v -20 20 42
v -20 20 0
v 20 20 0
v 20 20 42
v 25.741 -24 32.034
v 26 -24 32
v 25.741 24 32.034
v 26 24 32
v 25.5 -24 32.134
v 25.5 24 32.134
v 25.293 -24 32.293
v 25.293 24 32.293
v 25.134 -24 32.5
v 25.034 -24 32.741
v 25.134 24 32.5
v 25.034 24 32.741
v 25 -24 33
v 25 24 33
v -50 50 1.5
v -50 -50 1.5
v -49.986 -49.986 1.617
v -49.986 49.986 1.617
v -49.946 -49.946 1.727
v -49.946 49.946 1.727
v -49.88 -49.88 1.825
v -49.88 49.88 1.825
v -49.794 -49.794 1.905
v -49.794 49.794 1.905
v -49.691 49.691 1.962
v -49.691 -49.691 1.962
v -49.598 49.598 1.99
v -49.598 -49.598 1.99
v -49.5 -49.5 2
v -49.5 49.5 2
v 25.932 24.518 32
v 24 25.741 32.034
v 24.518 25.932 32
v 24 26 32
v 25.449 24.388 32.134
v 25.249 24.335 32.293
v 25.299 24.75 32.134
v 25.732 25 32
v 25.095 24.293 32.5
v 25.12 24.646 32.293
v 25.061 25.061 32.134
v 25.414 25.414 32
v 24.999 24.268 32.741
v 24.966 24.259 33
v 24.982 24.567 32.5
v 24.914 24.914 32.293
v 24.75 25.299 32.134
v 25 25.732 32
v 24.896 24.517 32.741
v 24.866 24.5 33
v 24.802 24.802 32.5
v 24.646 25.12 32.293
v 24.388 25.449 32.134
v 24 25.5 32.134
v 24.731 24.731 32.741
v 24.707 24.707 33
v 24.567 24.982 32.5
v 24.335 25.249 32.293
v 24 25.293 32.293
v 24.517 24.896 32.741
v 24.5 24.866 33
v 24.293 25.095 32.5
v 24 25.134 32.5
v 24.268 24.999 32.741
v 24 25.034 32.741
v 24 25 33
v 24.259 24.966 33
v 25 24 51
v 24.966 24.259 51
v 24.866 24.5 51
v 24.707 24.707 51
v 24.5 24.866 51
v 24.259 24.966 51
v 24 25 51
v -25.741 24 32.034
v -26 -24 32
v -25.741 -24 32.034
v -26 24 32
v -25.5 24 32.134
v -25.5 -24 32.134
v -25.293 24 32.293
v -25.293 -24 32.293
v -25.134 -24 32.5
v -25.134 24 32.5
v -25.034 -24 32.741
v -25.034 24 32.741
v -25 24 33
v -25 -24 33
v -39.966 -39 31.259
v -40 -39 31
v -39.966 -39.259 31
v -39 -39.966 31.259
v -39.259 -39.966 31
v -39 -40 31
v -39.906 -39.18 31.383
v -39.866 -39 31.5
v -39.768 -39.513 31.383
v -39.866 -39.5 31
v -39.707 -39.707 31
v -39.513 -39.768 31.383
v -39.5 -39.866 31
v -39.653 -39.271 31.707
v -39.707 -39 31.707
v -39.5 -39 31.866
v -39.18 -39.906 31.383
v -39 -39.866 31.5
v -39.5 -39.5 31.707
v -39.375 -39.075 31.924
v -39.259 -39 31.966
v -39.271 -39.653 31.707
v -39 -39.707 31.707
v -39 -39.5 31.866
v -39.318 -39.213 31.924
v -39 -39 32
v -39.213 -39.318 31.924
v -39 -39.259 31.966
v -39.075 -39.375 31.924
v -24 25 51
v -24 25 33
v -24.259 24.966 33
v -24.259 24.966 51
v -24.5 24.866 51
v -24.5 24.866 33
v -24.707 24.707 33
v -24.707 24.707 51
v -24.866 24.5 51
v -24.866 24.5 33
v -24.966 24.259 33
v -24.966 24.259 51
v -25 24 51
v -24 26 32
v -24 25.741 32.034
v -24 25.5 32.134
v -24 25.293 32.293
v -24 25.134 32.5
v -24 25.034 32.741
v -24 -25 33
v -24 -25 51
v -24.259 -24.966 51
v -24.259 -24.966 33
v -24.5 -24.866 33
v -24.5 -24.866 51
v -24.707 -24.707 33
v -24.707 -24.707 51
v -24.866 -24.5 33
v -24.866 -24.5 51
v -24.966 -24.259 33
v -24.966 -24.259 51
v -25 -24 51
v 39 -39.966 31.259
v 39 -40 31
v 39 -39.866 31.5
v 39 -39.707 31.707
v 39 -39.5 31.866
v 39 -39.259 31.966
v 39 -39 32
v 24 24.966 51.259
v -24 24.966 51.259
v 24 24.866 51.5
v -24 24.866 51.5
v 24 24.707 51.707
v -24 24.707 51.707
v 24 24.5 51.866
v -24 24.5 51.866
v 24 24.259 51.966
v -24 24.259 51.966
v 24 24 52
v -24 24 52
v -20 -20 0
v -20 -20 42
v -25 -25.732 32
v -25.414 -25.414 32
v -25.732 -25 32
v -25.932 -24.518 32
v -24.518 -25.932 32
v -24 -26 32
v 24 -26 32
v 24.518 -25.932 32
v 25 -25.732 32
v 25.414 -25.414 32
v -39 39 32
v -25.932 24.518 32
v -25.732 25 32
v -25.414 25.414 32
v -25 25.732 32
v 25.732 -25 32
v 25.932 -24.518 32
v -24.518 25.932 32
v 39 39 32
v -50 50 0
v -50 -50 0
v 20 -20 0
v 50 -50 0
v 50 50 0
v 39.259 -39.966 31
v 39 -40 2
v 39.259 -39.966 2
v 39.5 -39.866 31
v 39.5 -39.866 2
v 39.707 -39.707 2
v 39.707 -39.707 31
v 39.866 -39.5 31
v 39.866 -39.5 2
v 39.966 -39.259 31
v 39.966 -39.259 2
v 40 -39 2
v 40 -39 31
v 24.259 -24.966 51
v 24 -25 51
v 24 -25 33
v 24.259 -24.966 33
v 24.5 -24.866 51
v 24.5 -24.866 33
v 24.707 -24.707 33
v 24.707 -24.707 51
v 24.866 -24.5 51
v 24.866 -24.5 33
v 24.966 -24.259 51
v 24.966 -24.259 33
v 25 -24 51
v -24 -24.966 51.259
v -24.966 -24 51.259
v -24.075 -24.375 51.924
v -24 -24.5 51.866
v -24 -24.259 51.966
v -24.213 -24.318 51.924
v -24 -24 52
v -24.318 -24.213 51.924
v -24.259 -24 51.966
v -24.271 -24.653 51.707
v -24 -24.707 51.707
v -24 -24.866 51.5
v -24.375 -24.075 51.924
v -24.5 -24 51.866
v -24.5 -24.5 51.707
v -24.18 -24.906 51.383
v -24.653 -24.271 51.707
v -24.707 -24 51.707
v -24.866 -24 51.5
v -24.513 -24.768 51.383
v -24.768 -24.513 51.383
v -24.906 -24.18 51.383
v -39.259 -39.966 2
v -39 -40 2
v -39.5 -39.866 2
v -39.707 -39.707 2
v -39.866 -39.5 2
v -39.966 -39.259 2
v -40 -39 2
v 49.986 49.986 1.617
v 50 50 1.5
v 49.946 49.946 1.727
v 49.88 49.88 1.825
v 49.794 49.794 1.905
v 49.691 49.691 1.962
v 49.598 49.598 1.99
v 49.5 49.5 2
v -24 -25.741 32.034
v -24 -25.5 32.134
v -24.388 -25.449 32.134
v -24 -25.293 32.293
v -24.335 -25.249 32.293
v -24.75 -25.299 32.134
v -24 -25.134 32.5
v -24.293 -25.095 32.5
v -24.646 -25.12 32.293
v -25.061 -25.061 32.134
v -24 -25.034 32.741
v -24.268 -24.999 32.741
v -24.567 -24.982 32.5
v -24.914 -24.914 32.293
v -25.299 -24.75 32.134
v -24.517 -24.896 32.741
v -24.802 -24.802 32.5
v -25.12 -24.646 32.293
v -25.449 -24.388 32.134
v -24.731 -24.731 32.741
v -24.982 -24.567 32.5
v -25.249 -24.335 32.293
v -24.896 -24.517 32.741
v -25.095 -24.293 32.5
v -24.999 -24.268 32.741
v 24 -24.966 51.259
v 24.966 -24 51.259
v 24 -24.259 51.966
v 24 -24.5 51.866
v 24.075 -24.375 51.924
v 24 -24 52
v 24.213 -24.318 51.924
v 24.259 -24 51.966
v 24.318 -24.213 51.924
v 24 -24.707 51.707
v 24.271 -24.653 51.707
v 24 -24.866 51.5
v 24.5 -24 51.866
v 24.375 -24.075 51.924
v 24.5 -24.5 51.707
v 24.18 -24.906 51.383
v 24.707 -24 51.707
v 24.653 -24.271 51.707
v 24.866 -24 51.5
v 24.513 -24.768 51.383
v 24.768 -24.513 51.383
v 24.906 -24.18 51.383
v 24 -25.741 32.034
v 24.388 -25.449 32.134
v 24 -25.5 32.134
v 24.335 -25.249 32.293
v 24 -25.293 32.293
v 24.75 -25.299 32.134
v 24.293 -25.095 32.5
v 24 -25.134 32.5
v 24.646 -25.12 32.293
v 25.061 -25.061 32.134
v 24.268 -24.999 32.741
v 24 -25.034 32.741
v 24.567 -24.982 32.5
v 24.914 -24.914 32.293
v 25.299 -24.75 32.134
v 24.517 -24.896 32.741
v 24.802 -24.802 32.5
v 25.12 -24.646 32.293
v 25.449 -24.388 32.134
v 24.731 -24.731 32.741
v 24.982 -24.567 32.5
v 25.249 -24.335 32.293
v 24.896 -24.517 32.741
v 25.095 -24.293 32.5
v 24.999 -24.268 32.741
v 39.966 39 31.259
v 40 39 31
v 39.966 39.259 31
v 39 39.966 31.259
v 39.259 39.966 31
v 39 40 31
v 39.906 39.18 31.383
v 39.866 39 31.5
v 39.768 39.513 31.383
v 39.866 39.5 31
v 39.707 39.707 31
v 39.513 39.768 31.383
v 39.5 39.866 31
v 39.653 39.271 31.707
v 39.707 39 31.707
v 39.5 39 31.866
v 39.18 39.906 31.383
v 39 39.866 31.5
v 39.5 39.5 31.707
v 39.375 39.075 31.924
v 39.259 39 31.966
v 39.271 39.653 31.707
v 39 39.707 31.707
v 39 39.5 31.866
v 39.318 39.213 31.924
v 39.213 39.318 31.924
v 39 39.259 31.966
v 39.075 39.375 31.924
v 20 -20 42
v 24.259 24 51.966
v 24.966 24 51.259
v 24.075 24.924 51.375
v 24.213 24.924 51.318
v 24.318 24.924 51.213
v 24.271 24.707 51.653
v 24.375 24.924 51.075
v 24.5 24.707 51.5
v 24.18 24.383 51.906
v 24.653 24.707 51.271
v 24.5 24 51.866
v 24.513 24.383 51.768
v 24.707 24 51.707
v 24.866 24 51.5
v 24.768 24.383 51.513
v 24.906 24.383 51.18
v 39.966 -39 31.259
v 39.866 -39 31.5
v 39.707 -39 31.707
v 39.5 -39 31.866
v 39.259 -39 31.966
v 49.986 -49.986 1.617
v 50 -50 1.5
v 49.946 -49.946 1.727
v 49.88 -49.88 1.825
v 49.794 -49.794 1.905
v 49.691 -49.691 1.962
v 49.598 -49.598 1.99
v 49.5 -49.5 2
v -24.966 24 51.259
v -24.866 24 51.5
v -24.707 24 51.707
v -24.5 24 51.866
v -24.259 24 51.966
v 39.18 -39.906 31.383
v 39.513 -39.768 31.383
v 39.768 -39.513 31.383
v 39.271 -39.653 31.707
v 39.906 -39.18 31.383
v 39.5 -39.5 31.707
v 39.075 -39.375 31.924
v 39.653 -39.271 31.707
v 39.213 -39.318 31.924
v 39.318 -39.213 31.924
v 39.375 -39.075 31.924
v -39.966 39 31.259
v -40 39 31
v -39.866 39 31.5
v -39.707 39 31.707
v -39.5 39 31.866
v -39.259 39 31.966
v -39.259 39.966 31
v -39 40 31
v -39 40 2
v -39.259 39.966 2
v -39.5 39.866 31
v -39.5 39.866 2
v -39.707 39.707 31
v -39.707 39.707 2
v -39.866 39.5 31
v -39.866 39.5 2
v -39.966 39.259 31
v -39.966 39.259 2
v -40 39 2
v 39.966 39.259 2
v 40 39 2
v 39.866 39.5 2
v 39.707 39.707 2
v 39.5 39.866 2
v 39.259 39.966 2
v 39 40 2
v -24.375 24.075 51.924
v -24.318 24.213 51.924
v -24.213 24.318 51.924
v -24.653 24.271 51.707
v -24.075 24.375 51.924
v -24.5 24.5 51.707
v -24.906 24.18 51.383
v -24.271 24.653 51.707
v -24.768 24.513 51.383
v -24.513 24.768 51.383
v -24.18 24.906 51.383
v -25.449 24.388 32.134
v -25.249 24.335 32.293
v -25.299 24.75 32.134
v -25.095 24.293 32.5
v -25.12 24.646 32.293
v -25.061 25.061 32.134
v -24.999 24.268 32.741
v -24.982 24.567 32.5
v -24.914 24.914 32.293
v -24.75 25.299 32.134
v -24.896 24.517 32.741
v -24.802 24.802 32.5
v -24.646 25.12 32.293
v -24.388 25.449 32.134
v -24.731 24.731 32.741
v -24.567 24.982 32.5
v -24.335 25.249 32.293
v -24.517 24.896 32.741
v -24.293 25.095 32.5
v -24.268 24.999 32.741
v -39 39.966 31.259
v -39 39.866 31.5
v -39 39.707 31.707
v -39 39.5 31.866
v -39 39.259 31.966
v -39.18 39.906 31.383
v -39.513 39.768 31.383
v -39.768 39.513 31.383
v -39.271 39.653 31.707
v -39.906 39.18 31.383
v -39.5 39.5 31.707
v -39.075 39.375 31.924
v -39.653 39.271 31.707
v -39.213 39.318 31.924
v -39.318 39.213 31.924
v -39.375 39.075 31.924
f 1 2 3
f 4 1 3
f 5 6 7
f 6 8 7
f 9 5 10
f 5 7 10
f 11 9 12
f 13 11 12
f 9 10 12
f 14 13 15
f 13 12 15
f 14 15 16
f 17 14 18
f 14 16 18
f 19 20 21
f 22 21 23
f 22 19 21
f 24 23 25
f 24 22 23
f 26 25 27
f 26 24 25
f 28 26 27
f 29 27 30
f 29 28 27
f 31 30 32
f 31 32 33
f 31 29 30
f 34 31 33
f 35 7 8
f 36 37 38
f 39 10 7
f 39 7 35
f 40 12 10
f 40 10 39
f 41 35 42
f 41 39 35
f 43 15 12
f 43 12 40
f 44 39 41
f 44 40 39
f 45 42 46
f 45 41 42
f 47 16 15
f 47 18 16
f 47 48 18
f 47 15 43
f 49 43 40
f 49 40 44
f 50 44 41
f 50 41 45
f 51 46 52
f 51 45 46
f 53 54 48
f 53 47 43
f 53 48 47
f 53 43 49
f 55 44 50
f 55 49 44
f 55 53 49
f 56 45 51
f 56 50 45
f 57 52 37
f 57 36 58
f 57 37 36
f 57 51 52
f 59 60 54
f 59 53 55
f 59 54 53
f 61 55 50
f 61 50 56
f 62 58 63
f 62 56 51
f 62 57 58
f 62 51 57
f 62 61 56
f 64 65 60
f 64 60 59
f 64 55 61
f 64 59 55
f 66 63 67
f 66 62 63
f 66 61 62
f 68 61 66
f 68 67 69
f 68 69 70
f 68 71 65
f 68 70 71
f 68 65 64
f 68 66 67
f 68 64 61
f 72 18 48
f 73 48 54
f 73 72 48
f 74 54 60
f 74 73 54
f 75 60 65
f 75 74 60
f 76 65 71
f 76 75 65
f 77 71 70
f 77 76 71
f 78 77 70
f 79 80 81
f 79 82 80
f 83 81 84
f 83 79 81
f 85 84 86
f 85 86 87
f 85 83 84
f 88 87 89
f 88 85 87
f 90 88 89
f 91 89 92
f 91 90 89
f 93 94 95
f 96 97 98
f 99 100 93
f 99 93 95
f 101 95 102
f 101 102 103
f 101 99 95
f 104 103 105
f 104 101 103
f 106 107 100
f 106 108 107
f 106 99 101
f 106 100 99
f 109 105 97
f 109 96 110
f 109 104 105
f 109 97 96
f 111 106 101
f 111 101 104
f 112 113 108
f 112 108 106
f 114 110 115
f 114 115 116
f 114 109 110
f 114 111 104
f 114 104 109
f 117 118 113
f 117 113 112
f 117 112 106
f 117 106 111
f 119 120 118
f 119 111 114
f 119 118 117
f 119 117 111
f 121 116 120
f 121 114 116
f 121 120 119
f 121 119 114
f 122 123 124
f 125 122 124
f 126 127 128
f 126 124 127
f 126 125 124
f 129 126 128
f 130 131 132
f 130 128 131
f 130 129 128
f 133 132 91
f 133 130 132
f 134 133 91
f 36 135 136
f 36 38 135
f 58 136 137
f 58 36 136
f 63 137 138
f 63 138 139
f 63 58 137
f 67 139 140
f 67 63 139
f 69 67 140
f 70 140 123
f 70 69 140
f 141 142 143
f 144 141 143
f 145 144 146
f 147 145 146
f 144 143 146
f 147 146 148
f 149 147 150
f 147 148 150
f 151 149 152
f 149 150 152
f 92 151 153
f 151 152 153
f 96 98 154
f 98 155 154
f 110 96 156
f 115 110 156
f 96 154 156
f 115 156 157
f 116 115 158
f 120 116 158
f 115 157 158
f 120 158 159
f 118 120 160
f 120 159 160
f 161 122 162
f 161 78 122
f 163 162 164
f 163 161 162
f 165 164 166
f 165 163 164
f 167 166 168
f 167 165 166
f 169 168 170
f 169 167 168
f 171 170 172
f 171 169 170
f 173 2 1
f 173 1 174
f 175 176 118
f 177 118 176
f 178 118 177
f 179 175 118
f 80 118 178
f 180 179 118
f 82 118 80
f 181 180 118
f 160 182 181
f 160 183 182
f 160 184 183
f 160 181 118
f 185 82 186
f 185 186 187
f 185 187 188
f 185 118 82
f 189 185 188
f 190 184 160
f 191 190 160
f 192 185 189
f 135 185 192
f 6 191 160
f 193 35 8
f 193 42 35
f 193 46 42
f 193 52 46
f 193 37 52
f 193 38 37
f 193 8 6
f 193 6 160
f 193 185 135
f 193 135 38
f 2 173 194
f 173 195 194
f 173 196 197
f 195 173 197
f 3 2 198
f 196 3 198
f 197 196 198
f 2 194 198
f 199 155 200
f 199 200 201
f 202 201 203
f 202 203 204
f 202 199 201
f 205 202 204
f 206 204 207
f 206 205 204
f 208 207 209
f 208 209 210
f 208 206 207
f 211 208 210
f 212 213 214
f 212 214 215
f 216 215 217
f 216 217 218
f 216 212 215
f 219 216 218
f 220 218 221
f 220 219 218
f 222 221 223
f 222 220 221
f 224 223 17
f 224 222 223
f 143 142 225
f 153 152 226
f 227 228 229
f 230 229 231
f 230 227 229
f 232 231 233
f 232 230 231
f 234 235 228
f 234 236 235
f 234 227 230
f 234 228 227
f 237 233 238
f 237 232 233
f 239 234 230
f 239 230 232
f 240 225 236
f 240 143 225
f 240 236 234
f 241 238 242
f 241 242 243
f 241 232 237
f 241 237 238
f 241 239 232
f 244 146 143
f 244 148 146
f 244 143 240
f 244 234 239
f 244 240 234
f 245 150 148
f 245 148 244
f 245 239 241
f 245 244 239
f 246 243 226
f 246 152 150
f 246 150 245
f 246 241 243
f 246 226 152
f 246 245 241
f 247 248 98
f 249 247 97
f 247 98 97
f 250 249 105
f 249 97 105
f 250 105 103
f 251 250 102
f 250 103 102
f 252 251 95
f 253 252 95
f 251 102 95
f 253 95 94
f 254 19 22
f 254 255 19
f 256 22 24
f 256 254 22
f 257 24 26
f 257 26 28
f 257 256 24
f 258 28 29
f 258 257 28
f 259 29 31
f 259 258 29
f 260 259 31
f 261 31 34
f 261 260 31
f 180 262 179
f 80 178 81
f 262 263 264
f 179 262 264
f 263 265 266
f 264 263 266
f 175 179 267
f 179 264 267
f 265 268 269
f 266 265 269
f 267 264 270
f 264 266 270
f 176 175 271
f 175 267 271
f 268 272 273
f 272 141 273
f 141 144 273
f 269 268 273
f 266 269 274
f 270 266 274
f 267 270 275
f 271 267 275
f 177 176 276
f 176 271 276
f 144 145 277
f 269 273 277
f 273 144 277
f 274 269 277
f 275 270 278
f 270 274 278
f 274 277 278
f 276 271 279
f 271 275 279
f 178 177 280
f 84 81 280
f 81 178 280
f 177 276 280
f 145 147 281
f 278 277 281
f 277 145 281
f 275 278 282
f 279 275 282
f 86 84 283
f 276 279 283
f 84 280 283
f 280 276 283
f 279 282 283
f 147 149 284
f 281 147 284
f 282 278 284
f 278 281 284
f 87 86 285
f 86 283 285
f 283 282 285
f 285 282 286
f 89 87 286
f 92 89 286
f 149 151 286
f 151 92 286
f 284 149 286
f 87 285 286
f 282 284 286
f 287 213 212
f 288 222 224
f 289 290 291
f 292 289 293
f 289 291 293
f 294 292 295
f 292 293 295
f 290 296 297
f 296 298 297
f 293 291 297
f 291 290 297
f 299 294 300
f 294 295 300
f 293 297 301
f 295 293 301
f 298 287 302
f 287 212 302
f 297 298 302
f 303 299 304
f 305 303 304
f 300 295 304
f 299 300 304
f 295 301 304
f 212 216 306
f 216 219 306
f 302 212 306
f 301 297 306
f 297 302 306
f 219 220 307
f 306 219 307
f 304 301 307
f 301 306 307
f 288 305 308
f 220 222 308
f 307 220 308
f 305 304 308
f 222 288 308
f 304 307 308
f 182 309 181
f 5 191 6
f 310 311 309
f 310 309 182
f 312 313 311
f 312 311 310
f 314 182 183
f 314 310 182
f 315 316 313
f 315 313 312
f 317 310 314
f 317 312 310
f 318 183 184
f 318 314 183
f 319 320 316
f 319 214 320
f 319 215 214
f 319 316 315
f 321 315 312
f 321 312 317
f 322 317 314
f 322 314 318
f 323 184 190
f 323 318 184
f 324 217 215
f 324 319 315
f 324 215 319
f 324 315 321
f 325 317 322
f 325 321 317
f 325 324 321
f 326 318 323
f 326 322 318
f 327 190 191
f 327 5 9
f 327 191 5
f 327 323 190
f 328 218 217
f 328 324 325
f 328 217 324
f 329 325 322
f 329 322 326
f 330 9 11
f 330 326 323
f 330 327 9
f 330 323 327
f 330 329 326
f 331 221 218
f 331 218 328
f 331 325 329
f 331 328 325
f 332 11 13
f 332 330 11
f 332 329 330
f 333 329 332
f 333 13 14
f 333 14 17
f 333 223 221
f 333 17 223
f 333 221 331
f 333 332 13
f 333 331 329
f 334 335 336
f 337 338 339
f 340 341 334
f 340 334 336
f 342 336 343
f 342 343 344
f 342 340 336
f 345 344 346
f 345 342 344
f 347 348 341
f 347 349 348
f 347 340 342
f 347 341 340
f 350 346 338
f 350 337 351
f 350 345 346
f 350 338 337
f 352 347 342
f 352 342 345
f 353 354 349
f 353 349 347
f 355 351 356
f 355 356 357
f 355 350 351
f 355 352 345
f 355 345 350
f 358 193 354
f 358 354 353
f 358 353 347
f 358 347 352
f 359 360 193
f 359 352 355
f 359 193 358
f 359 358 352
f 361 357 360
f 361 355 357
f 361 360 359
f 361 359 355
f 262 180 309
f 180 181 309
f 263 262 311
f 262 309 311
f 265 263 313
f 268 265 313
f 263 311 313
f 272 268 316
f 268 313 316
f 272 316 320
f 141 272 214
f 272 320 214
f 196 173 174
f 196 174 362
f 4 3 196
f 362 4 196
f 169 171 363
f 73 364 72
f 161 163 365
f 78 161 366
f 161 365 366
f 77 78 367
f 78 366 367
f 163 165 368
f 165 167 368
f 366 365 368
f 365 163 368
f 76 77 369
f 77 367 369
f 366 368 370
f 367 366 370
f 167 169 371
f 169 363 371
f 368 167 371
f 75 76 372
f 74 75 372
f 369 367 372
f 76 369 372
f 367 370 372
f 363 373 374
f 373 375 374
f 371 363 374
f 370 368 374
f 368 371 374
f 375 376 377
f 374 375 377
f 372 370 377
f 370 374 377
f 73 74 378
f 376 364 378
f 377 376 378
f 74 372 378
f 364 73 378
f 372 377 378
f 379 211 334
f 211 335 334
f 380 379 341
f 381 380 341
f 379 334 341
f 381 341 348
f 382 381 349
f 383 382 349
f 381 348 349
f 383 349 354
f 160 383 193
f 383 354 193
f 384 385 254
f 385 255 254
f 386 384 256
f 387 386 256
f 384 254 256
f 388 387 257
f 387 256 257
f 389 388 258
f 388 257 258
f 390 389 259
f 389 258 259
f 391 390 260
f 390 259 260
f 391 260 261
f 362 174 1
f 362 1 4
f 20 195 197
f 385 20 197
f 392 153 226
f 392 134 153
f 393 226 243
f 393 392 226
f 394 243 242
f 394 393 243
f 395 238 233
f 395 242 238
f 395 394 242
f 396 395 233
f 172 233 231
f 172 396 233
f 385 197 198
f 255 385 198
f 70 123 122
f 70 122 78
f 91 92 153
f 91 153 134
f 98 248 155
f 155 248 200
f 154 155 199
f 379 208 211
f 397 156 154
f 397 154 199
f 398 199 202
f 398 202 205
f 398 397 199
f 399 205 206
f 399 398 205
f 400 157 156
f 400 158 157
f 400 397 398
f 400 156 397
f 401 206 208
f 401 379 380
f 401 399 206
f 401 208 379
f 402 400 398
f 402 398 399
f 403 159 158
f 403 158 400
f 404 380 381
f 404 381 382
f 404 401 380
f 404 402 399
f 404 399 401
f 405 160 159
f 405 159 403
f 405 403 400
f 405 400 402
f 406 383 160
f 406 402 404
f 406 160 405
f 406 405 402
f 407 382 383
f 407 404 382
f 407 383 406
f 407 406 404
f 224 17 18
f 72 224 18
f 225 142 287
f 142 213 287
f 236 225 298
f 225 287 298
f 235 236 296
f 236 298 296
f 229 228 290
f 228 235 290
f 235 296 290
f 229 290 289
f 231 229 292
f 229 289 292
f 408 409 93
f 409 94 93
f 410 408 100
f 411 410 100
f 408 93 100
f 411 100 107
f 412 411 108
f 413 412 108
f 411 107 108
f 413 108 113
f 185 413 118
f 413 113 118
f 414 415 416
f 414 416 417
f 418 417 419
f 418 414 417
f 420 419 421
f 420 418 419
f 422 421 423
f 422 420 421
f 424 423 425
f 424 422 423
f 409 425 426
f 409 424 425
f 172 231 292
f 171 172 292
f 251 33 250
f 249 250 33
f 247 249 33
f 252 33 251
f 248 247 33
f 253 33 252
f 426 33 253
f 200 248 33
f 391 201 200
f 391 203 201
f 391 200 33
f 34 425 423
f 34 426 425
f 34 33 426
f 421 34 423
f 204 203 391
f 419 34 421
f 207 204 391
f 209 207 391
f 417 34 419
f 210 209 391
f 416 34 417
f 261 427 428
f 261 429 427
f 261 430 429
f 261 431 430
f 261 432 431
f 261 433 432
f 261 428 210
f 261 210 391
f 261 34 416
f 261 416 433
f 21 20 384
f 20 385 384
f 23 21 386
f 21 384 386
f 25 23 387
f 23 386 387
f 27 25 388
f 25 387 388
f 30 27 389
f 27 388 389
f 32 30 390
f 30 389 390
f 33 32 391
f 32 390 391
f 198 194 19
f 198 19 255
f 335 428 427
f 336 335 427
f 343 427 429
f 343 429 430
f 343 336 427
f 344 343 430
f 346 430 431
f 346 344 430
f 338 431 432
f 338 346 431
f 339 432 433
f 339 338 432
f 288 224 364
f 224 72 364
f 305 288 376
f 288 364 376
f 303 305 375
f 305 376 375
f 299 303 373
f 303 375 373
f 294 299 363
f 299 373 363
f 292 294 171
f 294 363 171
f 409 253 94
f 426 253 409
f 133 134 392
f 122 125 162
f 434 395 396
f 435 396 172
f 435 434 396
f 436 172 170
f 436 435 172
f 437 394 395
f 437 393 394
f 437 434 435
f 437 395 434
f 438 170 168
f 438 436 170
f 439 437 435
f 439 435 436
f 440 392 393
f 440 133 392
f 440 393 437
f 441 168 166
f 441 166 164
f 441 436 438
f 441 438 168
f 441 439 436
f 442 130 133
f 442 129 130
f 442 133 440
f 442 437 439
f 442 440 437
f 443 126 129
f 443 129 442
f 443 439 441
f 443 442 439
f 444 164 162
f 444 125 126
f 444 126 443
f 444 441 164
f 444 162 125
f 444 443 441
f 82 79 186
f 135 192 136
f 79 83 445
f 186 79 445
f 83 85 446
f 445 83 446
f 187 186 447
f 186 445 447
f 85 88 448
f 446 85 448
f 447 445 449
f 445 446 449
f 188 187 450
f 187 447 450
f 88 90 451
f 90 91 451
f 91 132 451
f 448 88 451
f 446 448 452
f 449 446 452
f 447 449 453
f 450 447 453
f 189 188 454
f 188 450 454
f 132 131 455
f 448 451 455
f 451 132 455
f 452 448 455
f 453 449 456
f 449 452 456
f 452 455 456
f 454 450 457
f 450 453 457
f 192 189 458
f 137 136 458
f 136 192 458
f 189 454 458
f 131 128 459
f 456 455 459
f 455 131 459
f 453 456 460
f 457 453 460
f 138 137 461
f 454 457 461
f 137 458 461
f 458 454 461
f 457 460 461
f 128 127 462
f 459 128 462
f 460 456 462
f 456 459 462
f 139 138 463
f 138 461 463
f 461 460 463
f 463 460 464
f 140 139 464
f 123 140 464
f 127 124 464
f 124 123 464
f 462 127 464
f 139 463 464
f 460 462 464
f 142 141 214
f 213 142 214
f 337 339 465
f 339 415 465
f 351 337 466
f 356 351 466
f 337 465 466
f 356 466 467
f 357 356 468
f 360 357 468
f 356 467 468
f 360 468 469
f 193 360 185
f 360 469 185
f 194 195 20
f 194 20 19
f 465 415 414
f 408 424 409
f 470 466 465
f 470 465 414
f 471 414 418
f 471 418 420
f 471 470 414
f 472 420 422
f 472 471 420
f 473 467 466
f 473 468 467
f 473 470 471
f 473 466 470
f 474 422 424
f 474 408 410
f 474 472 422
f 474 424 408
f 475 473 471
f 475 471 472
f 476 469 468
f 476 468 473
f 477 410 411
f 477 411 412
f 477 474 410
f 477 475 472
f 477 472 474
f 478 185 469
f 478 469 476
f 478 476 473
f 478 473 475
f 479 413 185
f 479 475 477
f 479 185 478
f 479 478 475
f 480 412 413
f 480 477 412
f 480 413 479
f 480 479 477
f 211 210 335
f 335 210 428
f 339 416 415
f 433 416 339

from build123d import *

# Parameters (mm, degrees)
F0_W      = 100
F0_H      = 100
F1_DEPTH  = 2
F2_R      = 0.5
F4_W      = 80
F4_H      = 80
F5_DEPTH  = 30
F6_R      = 1
F7_R      = 1
F8_W      = 50
F8_H      = 50
F9_DEPTH  = 20
F10_R     = 1
F11_W     = 40
F11_H     = 40
F12_DEPTH = 42


with BuildPart() as f1:
    # F0 (on Top) → F1 (new body)
    with BuildSketch(Plane.XY):
        Rectangle(F0_W, F0_H)
    extrude(amount=F1_DEPTH)

    # F2
    f2_edges = [f1.edges().sort_by_distance(p)[0] for p in [
        (50, 0, 2),
        (0, 50, 2),
        (-50, 0, 2),
        (0, -50, 2),
    ]]
    fillet(f2_edges, radius=F2_R)

    # F4 (on offset) → F5 (join)
    with BuildSketch(Plane.XY.offset(2)):
        Rectangle(F4_W, F4_H)
    extrude(amount=F5_DEPTH)

    # F6
    f6_edges = [f1.edges().sort_by_distance(p)[0] for p in [
        (-40, -40, 17),
        (40, -40, 17),
        (40, 40, 17),
        (-40, 40, 17),
    ]]
    fillet(f6_edges, radius=F6_R)

    # F7
    f7_edges = [f1.edges().sort_by_distance(p)[0] for p in [
        (40, 0, 32),
        (39.707107, -39.707107, 32),
        (39.707107, 39.707107, 32),
        (0, -40, 32),
        (0, 40, 32),
        (-39.707107, -39.707107, 32),
        (-39.707107, 39.707107, 32),
        (-40, 0, 32),
    ]]
    fillet(f7_edges, radius=F7_R)

    # F8 (on face) → F9 (join)
    with BuildSketch(Plane.XY.offset(32)):
        Rectangle(F8_W, F8_H)
    extrude(amount=F9_DEPTH)

    # F10
    f10_edges = [f1.edges().sort_by_distance(p)[0] for p in [
        (-25, -25, 42),
        (25, -25, 42),
        (0, -25, 32),
        (0, -25, 52),
        (-25, 25, 42),
        (-25, 0, 32),
        (-25, 0, 52),
        (25, 0, 52),
        (0, 25, 52),
        (25, 25, 42),
        (25, 0, 32),
        (0, 25, 32),
    ]]
    fillet(f10_edges, radius=F10_R)

    # F11 (on face) → F12 (cut)
    with BuildSketch(Plane(origin=(0, 0, 0), x_dir=(1, 0, 0), z_dir=(0, 0, -1))):
        Rectangle(F11_W, F11_H)
    extrude(amount=-F12_DEPTH, mode=Mode.SUBTRACT)


solid = f1.part
